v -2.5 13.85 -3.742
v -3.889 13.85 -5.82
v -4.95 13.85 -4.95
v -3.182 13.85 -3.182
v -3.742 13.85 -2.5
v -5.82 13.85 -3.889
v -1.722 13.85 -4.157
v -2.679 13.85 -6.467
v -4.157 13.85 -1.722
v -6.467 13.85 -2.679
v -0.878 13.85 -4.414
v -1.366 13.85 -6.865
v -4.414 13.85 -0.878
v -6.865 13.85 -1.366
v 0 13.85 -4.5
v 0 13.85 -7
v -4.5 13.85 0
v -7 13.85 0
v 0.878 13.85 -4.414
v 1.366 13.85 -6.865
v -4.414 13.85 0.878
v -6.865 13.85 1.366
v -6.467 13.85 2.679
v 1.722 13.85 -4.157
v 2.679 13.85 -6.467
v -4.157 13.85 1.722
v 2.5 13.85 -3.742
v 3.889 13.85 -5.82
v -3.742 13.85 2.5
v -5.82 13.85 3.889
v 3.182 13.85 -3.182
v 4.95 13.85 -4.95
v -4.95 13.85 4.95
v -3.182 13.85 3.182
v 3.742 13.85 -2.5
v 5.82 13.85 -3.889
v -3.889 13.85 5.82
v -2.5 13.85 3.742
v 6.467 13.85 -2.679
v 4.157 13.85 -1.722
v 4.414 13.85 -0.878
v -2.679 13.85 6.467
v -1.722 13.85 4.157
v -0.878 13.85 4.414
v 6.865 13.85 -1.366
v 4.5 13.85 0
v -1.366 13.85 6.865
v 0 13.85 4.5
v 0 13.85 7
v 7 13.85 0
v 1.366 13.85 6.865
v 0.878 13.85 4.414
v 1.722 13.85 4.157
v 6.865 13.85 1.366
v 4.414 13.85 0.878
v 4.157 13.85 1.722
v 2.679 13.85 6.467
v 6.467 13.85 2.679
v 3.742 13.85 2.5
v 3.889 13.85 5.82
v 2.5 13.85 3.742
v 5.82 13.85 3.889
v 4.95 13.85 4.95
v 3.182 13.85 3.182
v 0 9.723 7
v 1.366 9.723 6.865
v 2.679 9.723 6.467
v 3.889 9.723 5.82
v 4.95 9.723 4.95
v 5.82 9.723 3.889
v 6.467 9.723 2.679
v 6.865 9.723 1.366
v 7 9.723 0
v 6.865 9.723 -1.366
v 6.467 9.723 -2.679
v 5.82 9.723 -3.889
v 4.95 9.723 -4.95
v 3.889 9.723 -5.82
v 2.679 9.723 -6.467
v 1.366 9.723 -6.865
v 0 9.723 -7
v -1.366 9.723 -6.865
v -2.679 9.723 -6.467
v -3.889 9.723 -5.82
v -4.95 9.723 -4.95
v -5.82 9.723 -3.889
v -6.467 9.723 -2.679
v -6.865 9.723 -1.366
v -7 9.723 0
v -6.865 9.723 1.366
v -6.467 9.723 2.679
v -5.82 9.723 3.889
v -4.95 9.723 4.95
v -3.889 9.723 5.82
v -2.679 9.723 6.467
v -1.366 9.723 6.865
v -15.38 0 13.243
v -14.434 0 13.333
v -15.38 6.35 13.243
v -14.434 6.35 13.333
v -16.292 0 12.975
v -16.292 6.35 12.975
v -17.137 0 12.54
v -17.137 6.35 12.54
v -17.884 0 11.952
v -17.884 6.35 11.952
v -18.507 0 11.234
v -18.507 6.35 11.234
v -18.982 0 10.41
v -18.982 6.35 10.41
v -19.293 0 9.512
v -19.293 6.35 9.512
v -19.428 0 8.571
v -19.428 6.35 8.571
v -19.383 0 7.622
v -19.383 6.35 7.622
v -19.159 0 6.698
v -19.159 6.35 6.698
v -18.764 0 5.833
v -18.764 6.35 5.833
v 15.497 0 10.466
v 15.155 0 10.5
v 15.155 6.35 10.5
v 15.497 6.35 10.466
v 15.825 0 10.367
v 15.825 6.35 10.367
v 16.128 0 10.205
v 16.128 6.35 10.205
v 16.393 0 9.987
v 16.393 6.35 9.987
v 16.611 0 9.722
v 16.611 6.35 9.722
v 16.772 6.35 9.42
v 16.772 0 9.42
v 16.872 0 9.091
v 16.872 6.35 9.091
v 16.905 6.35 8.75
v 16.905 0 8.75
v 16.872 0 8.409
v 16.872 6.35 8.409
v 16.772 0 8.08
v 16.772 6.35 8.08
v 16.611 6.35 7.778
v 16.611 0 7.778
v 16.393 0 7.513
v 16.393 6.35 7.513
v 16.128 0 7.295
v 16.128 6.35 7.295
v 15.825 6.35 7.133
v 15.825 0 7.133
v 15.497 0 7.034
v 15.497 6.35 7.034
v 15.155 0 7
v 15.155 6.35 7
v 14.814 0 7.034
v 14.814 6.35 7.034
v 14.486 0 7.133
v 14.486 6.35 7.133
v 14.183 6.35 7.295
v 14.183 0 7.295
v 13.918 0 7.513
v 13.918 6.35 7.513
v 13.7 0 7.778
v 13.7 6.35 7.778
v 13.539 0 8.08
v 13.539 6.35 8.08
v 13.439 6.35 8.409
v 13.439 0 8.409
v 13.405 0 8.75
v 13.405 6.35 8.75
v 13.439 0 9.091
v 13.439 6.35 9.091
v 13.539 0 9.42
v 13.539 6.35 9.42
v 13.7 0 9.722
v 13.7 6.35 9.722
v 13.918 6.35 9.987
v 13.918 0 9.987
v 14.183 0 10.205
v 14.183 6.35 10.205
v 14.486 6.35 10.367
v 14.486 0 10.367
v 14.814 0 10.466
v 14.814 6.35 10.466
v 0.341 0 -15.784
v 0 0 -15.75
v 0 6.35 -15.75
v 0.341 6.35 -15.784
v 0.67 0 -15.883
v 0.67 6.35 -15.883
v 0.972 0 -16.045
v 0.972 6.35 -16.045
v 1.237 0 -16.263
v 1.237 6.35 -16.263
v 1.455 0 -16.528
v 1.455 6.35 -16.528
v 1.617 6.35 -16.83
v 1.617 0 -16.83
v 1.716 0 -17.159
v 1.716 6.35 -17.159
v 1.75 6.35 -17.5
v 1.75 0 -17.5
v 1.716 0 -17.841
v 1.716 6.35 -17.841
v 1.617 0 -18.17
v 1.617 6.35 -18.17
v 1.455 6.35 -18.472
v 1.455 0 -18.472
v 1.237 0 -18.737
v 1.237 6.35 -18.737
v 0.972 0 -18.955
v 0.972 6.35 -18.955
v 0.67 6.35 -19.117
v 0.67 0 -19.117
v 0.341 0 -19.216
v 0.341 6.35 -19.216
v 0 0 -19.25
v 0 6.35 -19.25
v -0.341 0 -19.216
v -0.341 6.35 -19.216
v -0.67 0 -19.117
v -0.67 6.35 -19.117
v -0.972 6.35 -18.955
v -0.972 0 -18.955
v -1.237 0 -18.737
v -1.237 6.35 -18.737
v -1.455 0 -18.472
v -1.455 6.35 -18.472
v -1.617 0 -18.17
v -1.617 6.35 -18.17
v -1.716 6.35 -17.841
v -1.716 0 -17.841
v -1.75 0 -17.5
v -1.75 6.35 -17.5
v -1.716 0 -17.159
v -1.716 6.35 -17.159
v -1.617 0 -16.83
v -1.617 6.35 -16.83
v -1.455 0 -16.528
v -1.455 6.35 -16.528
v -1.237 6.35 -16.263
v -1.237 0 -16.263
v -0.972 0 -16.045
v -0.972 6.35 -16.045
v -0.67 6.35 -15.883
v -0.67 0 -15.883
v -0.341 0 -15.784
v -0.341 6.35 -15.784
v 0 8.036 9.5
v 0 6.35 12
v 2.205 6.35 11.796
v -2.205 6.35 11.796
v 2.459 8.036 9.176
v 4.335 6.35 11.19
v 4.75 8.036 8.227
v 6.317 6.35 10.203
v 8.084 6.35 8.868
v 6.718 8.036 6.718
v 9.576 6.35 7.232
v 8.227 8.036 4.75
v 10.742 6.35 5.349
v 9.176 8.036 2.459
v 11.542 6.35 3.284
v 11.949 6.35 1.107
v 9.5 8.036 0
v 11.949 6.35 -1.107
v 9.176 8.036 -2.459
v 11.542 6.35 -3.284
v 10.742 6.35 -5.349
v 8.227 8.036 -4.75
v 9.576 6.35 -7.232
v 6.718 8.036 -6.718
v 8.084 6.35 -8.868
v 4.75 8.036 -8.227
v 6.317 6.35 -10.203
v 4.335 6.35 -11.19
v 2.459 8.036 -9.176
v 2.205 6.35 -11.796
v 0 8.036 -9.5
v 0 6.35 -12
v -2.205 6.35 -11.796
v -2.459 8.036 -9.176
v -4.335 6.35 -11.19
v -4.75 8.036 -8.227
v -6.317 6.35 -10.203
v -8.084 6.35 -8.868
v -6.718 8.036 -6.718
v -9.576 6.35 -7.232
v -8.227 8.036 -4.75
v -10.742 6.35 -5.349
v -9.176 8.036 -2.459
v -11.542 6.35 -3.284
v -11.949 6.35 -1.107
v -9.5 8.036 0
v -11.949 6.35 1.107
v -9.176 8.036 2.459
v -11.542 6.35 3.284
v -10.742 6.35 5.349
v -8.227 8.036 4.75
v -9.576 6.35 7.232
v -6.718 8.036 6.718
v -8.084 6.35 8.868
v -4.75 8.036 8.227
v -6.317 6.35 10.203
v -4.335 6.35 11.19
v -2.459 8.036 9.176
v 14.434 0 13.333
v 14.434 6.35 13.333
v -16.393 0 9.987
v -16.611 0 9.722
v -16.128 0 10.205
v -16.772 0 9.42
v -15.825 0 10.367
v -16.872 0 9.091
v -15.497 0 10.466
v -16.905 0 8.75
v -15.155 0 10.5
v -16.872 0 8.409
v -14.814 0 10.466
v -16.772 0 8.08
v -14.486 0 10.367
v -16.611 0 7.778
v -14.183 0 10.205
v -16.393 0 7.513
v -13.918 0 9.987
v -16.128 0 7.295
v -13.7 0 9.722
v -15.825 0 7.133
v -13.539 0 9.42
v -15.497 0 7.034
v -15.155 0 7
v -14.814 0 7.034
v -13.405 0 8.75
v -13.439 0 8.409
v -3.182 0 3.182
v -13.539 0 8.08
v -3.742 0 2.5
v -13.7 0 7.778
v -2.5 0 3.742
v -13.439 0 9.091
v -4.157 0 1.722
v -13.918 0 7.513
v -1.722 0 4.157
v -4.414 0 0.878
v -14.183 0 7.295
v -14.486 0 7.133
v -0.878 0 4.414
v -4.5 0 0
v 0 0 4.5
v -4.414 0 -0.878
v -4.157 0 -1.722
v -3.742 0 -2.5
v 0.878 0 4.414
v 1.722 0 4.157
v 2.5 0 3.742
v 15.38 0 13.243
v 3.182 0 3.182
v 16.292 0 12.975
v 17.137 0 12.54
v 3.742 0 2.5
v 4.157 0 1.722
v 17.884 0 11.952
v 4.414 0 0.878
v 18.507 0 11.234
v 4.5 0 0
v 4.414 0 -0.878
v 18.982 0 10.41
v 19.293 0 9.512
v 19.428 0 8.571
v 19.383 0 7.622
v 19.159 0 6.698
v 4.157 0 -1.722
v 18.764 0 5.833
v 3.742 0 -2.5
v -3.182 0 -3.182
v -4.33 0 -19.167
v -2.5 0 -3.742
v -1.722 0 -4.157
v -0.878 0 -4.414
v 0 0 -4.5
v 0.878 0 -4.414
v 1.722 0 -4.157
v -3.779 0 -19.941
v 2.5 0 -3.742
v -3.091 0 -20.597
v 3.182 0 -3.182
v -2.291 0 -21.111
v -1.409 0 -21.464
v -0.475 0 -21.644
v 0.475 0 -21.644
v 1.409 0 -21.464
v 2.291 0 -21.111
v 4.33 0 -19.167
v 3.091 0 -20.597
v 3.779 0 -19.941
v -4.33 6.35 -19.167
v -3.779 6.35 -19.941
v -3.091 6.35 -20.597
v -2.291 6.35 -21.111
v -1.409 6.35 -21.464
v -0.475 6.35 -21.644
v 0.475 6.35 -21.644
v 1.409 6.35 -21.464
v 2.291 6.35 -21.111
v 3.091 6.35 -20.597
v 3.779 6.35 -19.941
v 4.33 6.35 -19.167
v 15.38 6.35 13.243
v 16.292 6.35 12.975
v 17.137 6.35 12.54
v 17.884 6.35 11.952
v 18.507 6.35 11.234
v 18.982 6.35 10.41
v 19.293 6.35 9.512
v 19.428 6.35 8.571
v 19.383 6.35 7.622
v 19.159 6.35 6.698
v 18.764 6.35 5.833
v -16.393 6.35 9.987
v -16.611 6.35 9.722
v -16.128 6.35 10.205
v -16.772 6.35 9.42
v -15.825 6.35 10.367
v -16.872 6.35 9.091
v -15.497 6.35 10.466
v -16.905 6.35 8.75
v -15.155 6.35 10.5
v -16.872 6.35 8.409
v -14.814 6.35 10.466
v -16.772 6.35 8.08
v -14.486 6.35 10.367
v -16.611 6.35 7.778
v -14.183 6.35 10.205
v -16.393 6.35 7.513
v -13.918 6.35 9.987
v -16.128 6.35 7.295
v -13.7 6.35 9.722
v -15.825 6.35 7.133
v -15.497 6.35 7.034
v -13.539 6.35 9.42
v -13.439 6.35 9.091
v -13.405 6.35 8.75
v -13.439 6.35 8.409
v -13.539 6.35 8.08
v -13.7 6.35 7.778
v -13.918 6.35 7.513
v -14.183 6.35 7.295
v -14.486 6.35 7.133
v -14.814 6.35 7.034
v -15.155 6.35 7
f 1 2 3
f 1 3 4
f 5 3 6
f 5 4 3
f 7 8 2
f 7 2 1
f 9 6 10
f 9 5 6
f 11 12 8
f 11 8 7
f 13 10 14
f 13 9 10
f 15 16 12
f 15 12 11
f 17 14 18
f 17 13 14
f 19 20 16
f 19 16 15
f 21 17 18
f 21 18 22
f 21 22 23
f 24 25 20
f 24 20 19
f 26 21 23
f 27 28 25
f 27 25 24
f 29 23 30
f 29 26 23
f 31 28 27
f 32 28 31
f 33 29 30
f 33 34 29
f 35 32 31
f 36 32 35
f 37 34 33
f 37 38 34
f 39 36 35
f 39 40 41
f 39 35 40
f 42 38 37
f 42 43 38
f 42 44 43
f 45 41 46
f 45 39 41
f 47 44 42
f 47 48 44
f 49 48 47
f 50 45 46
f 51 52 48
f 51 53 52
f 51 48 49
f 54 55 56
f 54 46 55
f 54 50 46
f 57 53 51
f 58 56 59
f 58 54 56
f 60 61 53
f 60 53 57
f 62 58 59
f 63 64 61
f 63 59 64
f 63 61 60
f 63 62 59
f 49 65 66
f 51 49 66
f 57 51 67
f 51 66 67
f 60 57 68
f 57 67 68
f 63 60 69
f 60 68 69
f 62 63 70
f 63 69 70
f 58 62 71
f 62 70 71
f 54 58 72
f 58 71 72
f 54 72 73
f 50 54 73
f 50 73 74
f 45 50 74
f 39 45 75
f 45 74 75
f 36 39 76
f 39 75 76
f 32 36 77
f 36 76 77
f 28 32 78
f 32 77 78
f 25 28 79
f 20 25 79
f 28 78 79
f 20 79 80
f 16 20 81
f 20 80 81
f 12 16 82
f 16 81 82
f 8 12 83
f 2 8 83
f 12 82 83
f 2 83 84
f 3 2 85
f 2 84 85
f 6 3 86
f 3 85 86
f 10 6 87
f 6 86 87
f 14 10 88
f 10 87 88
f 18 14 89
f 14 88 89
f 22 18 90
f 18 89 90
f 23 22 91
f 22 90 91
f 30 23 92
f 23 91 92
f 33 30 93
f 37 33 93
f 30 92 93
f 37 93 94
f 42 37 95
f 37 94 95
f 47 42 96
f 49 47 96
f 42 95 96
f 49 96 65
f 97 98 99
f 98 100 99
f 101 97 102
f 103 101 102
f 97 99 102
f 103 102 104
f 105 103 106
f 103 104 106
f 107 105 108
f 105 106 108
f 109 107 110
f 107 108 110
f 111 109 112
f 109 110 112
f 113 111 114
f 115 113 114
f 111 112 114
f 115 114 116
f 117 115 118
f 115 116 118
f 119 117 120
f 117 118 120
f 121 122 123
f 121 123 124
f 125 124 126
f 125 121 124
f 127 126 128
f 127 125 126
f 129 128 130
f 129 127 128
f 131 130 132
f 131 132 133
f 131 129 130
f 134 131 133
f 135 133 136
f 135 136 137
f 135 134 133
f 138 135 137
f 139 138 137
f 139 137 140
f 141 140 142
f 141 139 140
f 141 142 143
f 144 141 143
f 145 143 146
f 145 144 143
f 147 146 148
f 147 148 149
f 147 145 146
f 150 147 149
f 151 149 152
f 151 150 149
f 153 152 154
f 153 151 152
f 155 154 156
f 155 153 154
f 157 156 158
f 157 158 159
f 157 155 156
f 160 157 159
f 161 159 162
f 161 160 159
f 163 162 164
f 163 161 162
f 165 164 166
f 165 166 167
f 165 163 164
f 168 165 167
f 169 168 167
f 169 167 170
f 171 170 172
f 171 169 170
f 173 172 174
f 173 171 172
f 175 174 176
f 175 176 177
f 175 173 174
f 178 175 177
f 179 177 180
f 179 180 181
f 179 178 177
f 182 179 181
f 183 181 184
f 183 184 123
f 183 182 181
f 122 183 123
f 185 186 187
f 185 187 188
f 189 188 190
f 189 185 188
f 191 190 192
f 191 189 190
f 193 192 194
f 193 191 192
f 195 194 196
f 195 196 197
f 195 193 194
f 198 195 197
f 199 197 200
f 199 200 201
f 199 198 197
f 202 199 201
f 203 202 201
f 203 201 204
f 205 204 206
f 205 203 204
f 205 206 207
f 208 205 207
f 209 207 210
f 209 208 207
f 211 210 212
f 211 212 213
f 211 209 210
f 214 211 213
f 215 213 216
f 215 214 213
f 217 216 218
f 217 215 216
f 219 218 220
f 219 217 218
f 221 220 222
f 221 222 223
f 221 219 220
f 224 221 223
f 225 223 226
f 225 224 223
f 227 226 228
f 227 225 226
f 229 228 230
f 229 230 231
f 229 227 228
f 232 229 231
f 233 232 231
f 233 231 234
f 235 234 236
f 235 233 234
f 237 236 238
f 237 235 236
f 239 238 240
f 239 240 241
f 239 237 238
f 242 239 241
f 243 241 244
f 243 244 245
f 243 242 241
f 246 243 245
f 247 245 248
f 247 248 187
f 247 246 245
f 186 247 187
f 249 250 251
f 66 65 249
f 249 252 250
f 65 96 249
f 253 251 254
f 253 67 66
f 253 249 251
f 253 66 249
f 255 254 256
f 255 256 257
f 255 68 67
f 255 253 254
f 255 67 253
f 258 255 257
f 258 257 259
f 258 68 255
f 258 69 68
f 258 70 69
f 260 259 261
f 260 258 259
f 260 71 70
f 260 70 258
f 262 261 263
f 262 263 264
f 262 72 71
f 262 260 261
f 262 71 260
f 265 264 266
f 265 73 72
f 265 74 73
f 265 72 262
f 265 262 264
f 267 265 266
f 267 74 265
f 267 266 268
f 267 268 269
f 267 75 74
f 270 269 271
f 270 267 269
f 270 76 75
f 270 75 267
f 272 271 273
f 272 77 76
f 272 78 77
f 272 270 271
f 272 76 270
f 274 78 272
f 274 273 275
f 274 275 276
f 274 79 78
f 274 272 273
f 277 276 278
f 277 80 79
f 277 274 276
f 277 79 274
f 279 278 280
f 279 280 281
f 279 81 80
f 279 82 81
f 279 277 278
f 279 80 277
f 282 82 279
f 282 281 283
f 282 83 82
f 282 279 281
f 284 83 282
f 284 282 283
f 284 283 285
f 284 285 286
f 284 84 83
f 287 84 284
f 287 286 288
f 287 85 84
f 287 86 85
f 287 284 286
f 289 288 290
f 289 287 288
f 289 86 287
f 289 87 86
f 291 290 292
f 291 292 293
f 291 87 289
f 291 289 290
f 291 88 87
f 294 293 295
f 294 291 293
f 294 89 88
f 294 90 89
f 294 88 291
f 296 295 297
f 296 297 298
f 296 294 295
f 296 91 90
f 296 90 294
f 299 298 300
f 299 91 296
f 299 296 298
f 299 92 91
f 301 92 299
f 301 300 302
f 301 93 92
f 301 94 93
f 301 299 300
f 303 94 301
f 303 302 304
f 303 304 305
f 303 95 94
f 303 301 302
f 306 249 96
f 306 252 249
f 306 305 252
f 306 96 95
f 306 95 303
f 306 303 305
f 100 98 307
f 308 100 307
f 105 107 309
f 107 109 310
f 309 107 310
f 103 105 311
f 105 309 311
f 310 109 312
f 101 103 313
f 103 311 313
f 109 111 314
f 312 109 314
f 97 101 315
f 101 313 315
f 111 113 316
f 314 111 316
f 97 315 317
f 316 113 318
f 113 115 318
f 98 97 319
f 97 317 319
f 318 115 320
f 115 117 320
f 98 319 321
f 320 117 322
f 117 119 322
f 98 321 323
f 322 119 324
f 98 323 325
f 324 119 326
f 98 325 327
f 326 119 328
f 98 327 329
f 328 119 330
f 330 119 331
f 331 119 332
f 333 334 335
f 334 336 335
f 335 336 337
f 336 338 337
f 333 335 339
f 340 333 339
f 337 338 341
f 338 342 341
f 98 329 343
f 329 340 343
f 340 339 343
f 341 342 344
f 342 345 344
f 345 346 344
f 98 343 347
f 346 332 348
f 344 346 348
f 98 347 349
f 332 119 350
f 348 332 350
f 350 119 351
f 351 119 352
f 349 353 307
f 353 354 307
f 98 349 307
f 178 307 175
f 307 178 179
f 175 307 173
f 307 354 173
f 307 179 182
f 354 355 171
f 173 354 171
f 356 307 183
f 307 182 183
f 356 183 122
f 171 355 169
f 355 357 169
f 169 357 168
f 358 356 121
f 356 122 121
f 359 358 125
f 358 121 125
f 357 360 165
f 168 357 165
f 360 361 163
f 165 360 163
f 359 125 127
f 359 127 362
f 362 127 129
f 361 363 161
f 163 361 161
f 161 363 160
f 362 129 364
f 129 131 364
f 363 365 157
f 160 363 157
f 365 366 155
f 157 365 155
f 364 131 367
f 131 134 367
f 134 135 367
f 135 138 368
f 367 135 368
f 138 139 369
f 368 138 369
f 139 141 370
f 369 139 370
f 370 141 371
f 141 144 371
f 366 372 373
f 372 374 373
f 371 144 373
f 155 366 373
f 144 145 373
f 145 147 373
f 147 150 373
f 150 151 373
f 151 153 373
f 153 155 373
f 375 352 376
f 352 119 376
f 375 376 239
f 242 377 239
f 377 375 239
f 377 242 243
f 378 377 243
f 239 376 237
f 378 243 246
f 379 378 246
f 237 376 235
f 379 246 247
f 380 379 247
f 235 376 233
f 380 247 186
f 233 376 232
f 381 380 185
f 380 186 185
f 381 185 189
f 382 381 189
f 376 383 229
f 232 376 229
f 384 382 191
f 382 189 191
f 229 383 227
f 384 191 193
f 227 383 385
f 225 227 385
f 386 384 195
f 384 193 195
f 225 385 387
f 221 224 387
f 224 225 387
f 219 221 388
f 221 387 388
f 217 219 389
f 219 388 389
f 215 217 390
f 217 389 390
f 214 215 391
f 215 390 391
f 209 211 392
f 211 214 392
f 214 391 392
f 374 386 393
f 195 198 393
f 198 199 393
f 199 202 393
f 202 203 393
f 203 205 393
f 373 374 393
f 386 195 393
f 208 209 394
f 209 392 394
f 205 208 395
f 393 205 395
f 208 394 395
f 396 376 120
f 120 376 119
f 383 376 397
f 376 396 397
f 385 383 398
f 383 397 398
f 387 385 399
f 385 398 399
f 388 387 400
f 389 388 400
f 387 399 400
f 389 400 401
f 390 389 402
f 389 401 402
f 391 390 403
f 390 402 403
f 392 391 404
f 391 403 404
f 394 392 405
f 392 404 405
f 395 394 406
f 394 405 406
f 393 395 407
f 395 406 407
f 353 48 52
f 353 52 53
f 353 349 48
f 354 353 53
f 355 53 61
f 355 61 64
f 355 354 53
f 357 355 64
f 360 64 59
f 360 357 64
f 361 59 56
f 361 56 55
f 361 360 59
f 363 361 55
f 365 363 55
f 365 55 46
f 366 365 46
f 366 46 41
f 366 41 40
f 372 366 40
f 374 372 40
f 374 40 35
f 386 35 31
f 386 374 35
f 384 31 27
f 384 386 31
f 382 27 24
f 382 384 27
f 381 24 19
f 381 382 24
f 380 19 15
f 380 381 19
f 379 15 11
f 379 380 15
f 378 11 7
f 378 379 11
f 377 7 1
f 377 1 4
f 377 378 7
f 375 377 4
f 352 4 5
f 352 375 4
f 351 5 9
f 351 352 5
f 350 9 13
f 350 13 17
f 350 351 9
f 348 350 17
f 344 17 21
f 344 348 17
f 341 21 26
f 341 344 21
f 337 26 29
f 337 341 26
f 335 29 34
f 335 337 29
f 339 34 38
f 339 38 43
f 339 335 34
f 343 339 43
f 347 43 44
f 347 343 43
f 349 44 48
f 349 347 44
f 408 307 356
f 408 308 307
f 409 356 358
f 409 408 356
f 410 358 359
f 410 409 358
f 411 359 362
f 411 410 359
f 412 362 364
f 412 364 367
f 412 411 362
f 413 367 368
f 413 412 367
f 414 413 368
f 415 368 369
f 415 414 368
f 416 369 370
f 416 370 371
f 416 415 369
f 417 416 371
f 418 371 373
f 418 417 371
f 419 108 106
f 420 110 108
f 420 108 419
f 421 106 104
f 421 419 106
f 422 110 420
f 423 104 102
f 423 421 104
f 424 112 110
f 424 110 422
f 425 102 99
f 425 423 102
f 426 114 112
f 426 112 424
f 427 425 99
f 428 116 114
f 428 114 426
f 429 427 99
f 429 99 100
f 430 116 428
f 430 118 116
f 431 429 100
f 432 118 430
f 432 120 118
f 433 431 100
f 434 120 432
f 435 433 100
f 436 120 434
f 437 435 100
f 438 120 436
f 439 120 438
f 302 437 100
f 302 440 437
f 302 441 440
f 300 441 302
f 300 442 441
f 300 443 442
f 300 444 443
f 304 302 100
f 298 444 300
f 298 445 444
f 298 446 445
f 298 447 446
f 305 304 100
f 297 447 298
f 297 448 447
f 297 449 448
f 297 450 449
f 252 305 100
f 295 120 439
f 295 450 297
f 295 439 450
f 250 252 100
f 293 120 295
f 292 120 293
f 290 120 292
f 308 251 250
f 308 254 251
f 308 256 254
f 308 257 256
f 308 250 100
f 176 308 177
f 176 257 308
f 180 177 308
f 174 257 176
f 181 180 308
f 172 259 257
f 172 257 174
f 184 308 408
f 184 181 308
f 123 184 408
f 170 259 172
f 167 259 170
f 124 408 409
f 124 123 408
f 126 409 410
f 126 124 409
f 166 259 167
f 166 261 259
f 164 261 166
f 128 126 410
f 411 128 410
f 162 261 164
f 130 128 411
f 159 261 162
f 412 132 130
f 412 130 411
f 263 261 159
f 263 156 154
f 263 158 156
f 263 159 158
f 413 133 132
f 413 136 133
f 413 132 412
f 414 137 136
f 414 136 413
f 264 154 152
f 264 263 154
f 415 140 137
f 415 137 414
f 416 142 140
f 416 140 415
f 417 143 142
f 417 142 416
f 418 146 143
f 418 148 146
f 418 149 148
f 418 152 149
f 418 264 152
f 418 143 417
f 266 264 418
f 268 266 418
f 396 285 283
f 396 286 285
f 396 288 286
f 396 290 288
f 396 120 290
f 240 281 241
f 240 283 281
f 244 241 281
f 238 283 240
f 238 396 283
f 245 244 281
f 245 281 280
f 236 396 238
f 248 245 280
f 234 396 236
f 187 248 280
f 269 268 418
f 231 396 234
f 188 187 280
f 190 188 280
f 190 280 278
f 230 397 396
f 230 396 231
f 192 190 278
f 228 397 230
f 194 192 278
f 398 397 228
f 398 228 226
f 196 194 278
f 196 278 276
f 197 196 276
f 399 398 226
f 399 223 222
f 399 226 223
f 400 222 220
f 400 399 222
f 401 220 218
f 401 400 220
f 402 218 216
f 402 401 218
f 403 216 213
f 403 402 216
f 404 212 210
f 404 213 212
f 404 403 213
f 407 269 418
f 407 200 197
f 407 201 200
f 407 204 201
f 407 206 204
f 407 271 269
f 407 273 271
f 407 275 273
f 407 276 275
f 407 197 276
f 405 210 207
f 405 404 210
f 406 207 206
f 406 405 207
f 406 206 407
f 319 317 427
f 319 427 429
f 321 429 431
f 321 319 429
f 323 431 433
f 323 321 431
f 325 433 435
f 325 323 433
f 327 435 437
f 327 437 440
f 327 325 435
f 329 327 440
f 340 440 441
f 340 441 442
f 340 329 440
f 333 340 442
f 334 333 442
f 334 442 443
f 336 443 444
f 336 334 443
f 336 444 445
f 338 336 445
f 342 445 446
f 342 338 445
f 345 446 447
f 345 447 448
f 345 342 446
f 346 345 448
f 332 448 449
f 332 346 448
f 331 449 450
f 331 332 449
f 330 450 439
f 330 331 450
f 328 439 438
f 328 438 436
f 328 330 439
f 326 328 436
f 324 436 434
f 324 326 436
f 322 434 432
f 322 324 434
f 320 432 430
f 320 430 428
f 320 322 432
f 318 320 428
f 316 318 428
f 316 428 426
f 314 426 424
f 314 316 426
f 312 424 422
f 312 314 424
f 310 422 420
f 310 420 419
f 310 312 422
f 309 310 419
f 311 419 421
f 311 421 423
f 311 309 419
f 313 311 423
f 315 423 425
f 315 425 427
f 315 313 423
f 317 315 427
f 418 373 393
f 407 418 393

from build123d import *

# Parameters (mm, degrees)
SKETCH1_R           = 1.75
SKETCH1_R_2         = 4.5
BOSS_EXTRUDE1_DEPTH = 6.35
FILLET1_R           = 5
SKETCH2_R           = 7
SKETCH2_R_2         = 4.5
BOSS_EXTRUDE2_DEPTH = 7.5
CHAMFER1_SIZE       = 5
CHAMFER1_SIZE2      = 3.372542584


with BuildPart() as part:
    # Sketch1 → Boss-Extrude1 (new body)
    with BuildSketch(Plane(origin=(0, 0, 0), x_dir=(1, 0, 0), z_dir=(0, 1, 0))):
        Polygon((-23.094010768, -13.333333333), (23.094010768, -13.333333333), (0, 26.666666667), align=None)
        with Locations(Location((0, 17.5, 0), (0, 0, 270))):
            Circle(SKETCH1_R, mode=Mode.SUBTRACT)
        with Locations(Location((-15.155444566, -8.75, 0), (0, 0, 270))):
            Circle(SKETCH1_R, mode=Mode.SUBTRACT)
        with Locations(Location((15.155444566, -8.75, 0), (0, 0, 270))):
            Circle(SKETCH1_R, mode=Mode.SUBTRACT)
        with Locations(Location((0, 0, 0), (0, 0, 270))):
            Circle(SKETCH1_R_2, mode=Mode.SUBTRACT)
    extrude(amount=BOSS_EXTRUDE1_DEPTH)

    # Fillet1
    fillet1_edges = [part.edges().sort_by_distance(p)[0] for p in [
        (-23.094010768, 3.175, 13.333333333),
        (0, 3.175, -26.666666667),
        (23.094010768, 3.175, 13.333333333),
    ]]
    fillet(fillet1_edges, radius=FILLET1_R)

    # Sketch2 → Boss-Extrude2 (add)
    with BuildSketch(Plane(origin=(0, 6.35, 0), x_dir=(1, 0, 0), z_dir=(0, 1, 0))):
        with Locations(Location((0, 0, 0), (0, 0, 270))):
            Circle(SKETCH2_R)
        with Locations(Location((0, 0, 0), (0, 0, 270))):
            Circle(SKETCH2_R_2, mode=Mode.SUBTRACT)
    extrude(amount=BOSS_EXTRUDE2_DEPTH)

    # Chamfer1
    chamfer1_edges = [part.edges().sort_by_distance(p)[0] for p in [
        (0, 6.35, -7),
    ]]
    chamfer1_side = [part.faces().sort_by_distance(p)[0] for p in [
        (0, 6.35, 12.810295705),
    ]]
    chamfer(chamfer1_edges, length=CHAMFER1_SIZE, length2=CHAMFER1_SIZE2, reference=chamfer1_side[0])


solid = part.part
